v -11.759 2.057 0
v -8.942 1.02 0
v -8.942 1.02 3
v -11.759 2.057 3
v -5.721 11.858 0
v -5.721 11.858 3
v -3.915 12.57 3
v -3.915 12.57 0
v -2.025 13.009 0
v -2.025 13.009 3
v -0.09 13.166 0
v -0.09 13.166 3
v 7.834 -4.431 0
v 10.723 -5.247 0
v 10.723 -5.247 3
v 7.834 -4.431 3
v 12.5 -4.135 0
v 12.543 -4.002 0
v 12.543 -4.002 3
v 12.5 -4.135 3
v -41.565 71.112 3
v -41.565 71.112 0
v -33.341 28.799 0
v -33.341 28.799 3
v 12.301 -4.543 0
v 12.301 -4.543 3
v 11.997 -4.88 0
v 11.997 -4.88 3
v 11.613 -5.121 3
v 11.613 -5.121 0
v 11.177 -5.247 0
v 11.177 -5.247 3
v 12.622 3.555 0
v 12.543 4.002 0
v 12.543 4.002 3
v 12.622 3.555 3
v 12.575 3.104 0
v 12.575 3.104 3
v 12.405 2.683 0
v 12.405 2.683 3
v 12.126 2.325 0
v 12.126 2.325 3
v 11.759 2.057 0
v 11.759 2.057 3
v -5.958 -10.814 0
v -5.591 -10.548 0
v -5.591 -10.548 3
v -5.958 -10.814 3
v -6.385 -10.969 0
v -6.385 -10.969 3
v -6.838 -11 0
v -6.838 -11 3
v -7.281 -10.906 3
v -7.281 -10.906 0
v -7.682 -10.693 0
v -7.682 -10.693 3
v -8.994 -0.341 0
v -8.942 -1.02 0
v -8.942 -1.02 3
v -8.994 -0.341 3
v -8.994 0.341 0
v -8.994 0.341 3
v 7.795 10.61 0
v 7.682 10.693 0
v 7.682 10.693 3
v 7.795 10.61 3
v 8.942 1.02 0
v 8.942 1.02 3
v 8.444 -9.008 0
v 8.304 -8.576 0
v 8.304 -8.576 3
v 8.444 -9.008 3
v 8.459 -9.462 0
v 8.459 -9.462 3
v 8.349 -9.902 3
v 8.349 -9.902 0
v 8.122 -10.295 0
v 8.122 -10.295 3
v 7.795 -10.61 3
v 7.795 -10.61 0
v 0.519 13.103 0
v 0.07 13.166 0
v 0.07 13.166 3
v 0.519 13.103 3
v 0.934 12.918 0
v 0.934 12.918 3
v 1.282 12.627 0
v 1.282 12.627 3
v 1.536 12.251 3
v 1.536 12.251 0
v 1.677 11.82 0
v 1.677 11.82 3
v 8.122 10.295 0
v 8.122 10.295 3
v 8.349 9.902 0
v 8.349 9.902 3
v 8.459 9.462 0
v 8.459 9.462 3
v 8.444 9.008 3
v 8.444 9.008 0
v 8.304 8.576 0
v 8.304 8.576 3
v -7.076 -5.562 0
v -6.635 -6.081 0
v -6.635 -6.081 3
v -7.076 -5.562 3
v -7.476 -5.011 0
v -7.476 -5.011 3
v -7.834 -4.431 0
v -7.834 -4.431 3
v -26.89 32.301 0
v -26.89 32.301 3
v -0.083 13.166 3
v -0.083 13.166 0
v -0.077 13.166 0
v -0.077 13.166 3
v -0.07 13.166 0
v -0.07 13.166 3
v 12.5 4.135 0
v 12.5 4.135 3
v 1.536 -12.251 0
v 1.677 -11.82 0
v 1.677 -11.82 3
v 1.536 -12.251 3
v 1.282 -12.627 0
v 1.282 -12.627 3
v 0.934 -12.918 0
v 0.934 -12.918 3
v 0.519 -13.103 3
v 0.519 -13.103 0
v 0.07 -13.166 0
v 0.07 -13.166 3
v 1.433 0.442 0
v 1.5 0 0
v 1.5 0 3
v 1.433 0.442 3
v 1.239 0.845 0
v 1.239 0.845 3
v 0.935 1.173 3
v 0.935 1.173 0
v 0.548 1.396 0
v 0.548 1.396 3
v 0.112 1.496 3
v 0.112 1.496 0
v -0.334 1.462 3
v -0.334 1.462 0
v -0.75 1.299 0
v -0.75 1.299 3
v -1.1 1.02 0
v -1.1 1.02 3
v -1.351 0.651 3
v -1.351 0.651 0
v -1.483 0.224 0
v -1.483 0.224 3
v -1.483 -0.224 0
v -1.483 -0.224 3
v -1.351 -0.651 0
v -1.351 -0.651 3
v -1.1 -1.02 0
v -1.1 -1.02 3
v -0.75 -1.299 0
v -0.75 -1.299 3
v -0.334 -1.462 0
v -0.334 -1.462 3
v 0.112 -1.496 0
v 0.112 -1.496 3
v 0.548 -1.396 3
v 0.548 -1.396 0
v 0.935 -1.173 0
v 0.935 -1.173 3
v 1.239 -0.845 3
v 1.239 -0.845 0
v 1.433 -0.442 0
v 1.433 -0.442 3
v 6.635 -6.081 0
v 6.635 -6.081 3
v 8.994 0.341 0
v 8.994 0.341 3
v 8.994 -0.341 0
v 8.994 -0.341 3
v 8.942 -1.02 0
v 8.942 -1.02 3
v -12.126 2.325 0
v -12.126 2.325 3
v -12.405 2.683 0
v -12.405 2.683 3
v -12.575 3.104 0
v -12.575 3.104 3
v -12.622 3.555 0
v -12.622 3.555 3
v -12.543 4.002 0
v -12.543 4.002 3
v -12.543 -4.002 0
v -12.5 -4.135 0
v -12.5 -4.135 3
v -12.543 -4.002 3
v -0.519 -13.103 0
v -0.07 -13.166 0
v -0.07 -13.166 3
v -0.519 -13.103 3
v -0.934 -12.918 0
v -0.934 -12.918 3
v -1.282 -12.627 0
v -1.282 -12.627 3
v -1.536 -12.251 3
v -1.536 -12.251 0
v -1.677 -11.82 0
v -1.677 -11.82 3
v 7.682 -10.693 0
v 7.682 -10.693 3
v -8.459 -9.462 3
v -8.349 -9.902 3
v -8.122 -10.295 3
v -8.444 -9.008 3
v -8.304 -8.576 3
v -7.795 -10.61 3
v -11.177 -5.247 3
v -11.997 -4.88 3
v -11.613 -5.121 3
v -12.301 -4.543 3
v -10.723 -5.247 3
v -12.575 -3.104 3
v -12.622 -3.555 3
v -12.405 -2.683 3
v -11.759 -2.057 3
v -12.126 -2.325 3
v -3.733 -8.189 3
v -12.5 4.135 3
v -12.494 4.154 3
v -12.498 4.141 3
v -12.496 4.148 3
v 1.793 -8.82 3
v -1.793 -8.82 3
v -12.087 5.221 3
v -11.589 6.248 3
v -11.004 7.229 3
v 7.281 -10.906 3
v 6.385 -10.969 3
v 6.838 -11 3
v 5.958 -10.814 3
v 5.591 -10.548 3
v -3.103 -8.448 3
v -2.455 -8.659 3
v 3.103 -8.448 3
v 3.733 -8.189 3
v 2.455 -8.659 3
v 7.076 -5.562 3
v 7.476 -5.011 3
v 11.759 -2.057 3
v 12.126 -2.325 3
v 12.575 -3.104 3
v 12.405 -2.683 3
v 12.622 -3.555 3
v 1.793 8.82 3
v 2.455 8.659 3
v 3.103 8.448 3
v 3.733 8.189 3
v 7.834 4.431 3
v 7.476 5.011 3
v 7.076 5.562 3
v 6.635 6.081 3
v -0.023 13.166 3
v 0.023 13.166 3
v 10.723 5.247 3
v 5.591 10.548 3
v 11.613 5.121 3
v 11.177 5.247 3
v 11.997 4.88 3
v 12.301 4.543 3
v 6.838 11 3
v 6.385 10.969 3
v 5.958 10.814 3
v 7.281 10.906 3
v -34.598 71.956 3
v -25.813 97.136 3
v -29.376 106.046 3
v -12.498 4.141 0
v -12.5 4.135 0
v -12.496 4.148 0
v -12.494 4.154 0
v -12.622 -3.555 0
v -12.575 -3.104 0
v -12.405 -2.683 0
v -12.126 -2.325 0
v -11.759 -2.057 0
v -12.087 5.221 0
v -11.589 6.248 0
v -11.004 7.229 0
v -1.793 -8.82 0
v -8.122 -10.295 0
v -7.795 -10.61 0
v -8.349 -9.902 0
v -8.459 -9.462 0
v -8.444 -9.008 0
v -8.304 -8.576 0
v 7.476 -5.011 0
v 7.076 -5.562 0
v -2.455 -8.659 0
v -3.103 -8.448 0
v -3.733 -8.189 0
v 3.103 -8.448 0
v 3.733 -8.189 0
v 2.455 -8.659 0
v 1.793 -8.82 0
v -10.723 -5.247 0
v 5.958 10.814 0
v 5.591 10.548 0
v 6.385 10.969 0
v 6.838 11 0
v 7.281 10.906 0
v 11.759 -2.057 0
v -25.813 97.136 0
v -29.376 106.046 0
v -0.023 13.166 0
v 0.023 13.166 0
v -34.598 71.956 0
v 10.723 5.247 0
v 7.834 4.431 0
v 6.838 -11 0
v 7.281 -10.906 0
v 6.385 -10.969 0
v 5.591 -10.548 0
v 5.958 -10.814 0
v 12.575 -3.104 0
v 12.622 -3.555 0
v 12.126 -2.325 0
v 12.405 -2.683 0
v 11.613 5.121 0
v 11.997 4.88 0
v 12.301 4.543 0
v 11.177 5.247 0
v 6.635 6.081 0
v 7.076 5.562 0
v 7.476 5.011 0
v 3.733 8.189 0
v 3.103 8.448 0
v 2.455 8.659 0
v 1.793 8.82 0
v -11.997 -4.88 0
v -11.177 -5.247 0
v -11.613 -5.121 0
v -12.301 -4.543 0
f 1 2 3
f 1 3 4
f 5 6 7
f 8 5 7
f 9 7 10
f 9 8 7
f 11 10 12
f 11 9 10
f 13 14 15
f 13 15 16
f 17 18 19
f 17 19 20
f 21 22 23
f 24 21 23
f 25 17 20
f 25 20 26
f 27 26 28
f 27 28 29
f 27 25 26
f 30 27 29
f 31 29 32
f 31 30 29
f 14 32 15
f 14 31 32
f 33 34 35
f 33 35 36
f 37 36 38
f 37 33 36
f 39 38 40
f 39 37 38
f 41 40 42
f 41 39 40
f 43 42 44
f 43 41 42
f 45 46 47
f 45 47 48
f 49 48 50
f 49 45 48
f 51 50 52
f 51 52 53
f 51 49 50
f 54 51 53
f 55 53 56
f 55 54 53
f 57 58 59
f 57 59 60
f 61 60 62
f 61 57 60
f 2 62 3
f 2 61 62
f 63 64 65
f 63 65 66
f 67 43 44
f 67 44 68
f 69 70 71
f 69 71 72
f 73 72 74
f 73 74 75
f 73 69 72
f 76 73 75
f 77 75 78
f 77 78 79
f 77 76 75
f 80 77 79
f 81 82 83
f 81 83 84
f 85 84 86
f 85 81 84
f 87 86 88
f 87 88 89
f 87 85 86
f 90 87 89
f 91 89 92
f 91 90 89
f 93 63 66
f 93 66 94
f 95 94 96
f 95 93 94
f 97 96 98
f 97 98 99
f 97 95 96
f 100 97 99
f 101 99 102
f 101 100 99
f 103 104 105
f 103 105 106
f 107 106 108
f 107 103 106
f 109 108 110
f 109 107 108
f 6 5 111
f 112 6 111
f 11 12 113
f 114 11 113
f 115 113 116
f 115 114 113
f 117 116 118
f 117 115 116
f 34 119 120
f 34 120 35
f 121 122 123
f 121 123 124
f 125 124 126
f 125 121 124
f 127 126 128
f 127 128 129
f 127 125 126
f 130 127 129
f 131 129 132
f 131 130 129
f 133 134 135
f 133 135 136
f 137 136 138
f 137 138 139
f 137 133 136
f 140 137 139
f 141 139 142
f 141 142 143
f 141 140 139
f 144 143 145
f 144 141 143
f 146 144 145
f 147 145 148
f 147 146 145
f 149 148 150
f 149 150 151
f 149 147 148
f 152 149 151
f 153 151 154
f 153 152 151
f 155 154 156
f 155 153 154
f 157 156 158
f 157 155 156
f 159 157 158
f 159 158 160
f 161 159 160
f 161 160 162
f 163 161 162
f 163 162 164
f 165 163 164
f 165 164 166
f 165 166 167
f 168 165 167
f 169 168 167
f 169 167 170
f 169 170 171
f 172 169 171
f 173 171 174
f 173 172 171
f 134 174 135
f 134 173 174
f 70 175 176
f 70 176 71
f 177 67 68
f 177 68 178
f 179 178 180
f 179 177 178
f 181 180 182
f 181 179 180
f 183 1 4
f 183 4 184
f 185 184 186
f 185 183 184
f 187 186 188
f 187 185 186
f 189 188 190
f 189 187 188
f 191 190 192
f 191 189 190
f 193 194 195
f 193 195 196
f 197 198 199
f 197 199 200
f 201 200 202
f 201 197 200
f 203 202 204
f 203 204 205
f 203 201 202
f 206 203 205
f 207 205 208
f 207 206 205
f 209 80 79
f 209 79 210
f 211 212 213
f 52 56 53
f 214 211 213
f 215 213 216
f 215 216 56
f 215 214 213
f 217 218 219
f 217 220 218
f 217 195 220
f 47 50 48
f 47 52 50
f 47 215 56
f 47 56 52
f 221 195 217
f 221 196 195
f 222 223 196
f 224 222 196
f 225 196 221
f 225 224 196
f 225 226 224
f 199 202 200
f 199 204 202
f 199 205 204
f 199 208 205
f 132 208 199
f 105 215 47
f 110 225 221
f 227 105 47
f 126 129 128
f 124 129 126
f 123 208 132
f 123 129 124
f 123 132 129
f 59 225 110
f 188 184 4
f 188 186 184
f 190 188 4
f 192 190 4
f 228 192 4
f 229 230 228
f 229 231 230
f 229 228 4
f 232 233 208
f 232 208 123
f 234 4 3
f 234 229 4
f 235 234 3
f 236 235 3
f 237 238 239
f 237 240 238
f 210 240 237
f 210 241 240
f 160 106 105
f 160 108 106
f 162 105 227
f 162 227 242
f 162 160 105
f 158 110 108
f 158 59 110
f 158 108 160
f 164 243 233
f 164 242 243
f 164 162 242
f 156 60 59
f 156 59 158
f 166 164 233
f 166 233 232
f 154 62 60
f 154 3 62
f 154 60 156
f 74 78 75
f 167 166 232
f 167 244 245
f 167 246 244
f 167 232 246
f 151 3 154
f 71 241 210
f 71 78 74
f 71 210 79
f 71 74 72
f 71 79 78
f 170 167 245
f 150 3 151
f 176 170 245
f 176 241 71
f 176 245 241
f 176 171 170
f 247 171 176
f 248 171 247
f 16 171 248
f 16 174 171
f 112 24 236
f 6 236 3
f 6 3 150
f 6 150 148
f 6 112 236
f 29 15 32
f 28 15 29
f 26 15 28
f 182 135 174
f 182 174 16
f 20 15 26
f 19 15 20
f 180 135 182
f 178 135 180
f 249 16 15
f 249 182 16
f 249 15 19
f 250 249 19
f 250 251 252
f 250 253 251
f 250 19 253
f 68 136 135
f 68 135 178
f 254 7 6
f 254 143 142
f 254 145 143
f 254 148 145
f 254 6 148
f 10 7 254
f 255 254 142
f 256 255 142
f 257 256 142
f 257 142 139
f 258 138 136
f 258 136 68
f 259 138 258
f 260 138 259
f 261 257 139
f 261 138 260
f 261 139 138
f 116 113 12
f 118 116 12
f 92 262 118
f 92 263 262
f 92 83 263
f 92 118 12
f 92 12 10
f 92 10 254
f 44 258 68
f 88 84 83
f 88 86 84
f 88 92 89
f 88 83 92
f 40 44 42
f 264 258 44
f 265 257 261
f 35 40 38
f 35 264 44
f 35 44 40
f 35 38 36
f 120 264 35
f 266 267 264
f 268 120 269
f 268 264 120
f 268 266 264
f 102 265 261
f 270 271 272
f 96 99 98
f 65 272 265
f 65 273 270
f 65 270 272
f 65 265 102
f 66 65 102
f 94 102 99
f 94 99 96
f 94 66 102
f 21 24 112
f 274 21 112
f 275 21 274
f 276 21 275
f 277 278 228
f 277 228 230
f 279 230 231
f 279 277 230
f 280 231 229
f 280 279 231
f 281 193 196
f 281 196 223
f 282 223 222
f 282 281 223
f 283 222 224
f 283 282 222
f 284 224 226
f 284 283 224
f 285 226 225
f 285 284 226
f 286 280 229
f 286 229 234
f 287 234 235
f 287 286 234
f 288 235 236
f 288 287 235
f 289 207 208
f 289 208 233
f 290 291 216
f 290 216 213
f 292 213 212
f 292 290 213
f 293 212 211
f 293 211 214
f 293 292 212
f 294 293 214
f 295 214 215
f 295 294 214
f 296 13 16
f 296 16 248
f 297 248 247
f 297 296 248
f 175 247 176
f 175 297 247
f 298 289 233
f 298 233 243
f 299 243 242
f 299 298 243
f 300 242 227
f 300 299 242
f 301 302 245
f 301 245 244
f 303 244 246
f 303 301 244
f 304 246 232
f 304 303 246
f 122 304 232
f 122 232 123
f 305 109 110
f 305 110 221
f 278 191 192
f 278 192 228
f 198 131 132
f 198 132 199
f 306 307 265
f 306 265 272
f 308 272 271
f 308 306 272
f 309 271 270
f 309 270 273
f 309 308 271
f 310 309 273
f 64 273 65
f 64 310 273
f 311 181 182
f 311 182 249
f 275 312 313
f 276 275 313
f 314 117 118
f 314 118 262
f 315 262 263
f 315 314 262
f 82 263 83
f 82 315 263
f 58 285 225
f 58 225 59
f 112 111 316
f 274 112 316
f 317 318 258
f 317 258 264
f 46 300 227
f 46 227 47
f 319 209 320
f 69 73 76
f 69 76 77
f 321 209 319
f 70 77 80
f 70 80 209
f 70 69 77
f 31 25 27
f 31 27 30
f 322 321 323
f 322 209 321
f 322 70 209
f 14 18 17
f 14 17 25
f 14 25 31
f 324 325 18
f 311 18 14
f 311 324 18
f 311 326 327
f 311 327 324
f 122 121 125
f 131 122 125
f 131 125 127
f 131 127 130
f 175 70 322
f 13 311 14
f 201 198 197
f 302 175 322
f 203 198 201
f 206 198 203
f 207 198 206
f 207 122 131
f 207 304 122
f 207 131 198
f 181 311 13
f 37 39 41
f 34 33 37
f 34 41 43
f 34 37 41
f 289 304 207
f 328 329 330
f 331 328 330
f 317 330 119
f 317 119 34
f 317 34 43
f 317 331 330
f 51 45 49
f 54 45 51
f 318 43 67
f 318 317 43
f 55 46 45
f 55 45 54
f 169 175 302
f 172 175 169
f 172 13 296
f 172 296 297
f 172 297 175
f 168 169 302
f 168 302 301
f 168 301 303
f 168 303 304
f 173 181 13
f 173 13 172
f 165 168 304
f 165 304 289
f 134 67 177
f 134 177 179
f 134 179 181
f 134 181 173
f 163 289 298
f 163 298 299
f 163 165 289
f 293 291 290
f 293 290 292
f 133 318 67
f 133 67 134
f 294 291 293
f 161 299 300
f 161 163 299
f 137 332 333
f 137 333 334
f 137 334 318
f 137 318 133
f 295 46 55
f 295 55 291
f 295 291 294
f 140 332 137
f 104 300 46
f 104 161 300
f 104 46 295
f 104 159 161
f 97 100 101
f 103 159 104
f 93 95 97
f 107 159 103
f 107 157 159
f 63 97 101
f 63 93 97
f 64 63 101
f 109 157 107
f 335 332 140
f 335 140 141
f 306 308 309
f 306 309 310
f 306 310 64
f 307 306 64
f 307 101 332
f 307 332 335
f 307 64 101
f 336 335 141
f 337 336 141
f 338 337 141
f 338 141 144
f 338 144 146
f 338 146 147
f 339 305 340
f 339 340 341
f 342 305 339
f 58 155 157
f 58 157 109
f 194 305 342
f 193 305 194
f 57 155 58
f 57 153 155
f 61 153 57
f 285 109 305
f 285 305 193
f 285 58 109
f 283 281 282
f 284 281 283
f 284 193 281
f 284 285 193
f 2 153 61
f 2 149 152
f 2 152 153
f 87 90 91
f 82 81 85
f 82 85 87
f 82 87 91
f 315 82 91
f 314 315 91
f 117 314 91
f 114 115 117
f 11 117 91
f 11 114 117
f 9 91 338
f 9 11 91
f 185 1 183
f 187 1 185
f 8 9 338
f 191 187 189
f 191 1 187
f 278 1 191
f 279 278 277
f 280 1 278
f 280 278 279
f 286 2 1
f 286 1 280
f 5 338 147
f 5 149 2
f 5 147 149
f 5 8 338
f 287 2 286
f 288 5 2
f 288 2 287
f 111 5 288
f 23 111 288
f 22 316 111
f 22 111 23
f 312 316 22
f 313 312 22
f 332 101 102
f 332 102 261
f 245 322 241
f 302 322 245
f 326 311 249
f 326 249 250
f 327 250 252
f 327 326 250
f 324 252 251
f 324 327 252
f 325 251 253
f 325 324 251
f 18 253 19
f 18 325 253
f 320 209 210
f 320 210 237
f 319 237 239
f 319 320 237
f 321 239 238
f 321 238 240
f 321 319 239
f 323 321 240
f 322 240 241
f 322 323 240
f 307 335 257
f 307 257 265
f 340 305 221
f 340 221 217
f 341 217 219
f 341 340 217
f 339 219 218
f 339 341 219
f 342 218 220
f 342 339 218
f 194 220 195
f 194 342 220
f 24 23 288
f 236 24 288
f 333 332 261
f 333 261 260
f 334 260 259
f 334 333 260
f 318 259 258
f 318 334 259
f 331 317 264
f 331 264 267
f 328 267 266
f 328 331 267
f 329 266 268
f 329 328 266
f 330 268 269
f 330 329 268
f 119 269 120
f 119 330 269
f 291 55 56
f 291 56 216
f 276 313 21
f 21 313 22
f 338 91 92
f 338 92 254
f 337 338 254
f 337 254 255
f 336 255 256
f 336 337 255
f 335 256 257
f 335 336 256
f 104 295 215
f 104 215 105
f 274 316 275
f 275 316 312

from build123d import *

# Parameters (mm, degrees)
SKETCH_1_R      = 1.5
EXTRUDE_2_DEPTH = 3
EXTRUDE_4_DEPTH = 3
EXTRUDE_6_DEPTH = 3


with BuildPart() as part:
    # 草圖1 → 填料-伸長2 (new body)
    with BuildSketch(Plane.XY):
        with BuildLine():
            Line((-1.793397634, 8.819508202), (-1.677039065, 11.819508202))
            ThreePointArc((-1.677039065, 11.819508202), (-1.118204833, 12.784789062), (-0.06994368, 13.165855188))
            Line((-0.06994368, 13.165855188), (0.06994368, 13.165855188))
            ThreePointArc((0.06994368, 13.165855188), (1.118204833, 12.784789062), (1.677039065, 11.819508202))
            Line((1.677039065, 11.819508202), (1.793397634, 8.819508202))
            ThreePointArc((1.793397634, 8.819508202), (2.781152949, 8.559508647), (3.73308769, 8.189264698))
            Line((3.73308769, 8.189264698), (5.590579507, 10.54792183))
            ThreePointArc((5.590579507, 10.54792183), (6.610063751, 11.000375931), (7.682109887, 10.692512456))
            Line((7.682109887, 10.692512456), (7.795281139, 10.610288729))
            ThreePointArc((7.795281139, 10.610288729), (8.419357178, 9.685847311), (8.304085714, 8.576444171))
            Line((8.304085714, 8.576444171), (6.634866017, 6.080999337))
            ThreePointArc((6.634866017, 6.080999337), (7.281152949, 5.290067271), (7.8336604, 4.431000423))
            Line((7.8336604, 4.431000423), (10.722786724, 5.24738783))
            ThreePointArc((10.722786724, 5.24738783), (11.81351265, 5.014193083), (12.499858583, 4.134993391))
            Line((12.499858583, 4.134993391), (12.543086154, 4.001952606))
            ThreePointArc((12.543086154, 4.001952606), (12.504601244, 2.887241097), (11.759253866, 2.057469969))
            Line((11.759253866, 2.057469969), (8.942041093, 1.01975541))
            ThreePointArc((8.942041093, 1.01975541), (9, 0), (8.942041093, -1.01975541))
            Line((8.942041093, -1.01975541), (11.759253866, -2.057469969))
            ThreePointArc((11.759253866, -2.057469969), (12.504601244, -2.887241097), (12.543086154, -4.001952606))
            Line((12.543086154, -4.001952606), (12.499858583, -4.134993391))
            ThreePointArc((12.499858583, -4.134993391), (11.81351265, -5.014193083), (10.722786724, -5.24738783))
            Line((10.722786724, -5.24738783), (7.8336604, -4.431000423))
            ThreePointArc((7.8336604, -4.431000423), (7.281152949, -5.290067271), (6.634866017, -6.080999337))
            Line((6.634866017, -6.080999337), (8.304085714, -8.576444171))
            ThreePointArc((8.304085714, -8.576444171), (8.419357178, -9.685847311), (7.795281139, -10.610288729))
            Line((7.795281139, -10.610288729), (7.682109887, -10.692512456))
            ThreePointArc((7.682109887, -10.692512456), (6.610063751, -11.000375931), (5.590579507, -10.54792183))
            Line((5.590579507, -10.54792183), (3.73308769, -8.189264698))
            ThreePointArc((3.73308769, -8.189264698), (2.781152949, -8.559508647), (1.793397634, -8.819508202))
            Line((1.793397634, -8.819508202), (1.677039065, -11.819508202))
            ThreePointArc((1.677039065, -11.819508202), (1.118204833, -12.784789062), (0.06994368, -13.165855188))
            Line((0.06994368, -13.165855188), (-0.06994368, -13.165855188))
            ThreePointArc((-0.06994368, -13.165855188), (-1.118204833, -12.784789062), (-1.677039065, -11.819508202))
            Line((-1.677039065, -11.819508202), (-1.793397634, -8.819508202))
            ThreePointArc((-1.793397634, -8.819508202), (-2.781152949, -8.559508647), (-3.73308769, -8.189264698))
            Line((-3.73308769, -8.189264698), (-5.590579507, -10.54792183))
            ThreePointArc((-5.590579507, -10.54792183), (-6.610063751, -11.000375931), (-7.682109887, -10.692512456))
            Line((-7.682109887, -10.692512456), (-7.795281139, -10.610288729))
            ThreePointArc((-7.795281139, -10.610288729), (-8.419357178, -9.685847311), (-8.304085714, -8.576444171))
            Line((-8.304085714, -8.576444171), (-6.634866017, -6.080999337))
            ThreePointArc((-6.634866017, -6.080999337), (-7.281152949, -5.290067271), (-7.8336604, -4.431000423))
            Line((-7.8336604, -4.431000423), (-10.722786724, -5.24738783))
            ThreePointArc((-10.722786724, -5.24738783), (-11.81351265, -5.014193083), (-12.499858583, -4.134993391))
            Line((-12.499858583, -4.134993391), (-12.543086154, -4.001952606))
            ThreePointArc((-12.543086154, -4.001952606), (-12.504601244, -2.887241097), (-11.759253866, -2.057469969))
            Line((-11.759253866, -2.057469969), (-8.942041093, -1.01975541))
            ThreePointArc((-8.942041093, -1.01975541), (-9, 0), (-8.942041093, 1.01975541))
            Line((-8.942041093, 1.01975541), (-11.759253866, 2.057469969))
            ThreePointArc((-11.759253866, 2.057469969), (-12.504601244, 2.887241097), (-12.543086154, 4.001952606))
            Line((-12.543086154, 4.001952606), (-12.499858583, 4.134993391))
            ThreePointArc((-12.499858583, 4.134993391), (-11.81351265, 5.014193083), (-10.722786724, 5.24738783))
            Line((-10.722786724, 5.24738783), (-7.8336604, 4.431000423))
            ThreePointArc((-7.8336604, 4.431000423), (-7.281152949, 5.290067271), (-6.634866017, 6.080999337))
            Line((-6.634866017, 6.080999337), (-8.304085714, 8.576444171))
            ThreePointArc((-8.304085714, 8.576444171), (-8.419357178, 9.685847311), (-7.795281139, 10.610288729))
            Line((-7.795281139, 10.610288729), (-7.682109887, 10.692512456))
            ThreePointArc((-7.682109887, 10.692512456), (-6.610063751, 11.000375931), (-5.590579507, 10.54792183))
            Line((-5.590579507, 10.54792183), (-3.73308769, 8.189264698))
            ThreePointArc((-3.73308769, 8.189264698), (-2.781152949, 8.559508647), (-1.793397634, 8.819508202))
        make_face()
        Circle(SKETCH_1_R, mode=Mode.SUBTRACT)
    extrude(amount=EXTRUDE_2_DEPTH)

    # 草圖2 → 填料-伸長4 (add)
    with BuildSketch(Plane.XY):
        with BuildLine():
            Line((0.06994368, 13.165855188), (0.06994368, 2.180013358))
            Line((0.06994368, 2.180013358), (-12.493626598, 4.153784946))
            ThreePointArc((-12.493626598, 4.153784946), (-7.674068466, 10.698285289), (0.06994368, 13.165855188))
        make_face()
    extrude(amount=EXTRUDE_4_DEPTH)

    # 草圖5 → 填料-伸長6 (add)
    with BuildSketch(Plane(origin=(0, 0, 0), x_dir=(-1, 0, 0), z_dir=(0, 0, -1))):
        Polygon((5.459056235, 11.60527133), (26.890281071, 32.301164585), (34.5983103, 71.955537312), (25.812503152, 97.136016411), (29.376125038, 106.046106934), (41.565268435, 71.111528315), (33.340538439, 28.798960582), (10.321664828, 6.569892728), align=None)
    extrude(amount=-EXTRUDE_6_DEPTH)


solid = part.part
